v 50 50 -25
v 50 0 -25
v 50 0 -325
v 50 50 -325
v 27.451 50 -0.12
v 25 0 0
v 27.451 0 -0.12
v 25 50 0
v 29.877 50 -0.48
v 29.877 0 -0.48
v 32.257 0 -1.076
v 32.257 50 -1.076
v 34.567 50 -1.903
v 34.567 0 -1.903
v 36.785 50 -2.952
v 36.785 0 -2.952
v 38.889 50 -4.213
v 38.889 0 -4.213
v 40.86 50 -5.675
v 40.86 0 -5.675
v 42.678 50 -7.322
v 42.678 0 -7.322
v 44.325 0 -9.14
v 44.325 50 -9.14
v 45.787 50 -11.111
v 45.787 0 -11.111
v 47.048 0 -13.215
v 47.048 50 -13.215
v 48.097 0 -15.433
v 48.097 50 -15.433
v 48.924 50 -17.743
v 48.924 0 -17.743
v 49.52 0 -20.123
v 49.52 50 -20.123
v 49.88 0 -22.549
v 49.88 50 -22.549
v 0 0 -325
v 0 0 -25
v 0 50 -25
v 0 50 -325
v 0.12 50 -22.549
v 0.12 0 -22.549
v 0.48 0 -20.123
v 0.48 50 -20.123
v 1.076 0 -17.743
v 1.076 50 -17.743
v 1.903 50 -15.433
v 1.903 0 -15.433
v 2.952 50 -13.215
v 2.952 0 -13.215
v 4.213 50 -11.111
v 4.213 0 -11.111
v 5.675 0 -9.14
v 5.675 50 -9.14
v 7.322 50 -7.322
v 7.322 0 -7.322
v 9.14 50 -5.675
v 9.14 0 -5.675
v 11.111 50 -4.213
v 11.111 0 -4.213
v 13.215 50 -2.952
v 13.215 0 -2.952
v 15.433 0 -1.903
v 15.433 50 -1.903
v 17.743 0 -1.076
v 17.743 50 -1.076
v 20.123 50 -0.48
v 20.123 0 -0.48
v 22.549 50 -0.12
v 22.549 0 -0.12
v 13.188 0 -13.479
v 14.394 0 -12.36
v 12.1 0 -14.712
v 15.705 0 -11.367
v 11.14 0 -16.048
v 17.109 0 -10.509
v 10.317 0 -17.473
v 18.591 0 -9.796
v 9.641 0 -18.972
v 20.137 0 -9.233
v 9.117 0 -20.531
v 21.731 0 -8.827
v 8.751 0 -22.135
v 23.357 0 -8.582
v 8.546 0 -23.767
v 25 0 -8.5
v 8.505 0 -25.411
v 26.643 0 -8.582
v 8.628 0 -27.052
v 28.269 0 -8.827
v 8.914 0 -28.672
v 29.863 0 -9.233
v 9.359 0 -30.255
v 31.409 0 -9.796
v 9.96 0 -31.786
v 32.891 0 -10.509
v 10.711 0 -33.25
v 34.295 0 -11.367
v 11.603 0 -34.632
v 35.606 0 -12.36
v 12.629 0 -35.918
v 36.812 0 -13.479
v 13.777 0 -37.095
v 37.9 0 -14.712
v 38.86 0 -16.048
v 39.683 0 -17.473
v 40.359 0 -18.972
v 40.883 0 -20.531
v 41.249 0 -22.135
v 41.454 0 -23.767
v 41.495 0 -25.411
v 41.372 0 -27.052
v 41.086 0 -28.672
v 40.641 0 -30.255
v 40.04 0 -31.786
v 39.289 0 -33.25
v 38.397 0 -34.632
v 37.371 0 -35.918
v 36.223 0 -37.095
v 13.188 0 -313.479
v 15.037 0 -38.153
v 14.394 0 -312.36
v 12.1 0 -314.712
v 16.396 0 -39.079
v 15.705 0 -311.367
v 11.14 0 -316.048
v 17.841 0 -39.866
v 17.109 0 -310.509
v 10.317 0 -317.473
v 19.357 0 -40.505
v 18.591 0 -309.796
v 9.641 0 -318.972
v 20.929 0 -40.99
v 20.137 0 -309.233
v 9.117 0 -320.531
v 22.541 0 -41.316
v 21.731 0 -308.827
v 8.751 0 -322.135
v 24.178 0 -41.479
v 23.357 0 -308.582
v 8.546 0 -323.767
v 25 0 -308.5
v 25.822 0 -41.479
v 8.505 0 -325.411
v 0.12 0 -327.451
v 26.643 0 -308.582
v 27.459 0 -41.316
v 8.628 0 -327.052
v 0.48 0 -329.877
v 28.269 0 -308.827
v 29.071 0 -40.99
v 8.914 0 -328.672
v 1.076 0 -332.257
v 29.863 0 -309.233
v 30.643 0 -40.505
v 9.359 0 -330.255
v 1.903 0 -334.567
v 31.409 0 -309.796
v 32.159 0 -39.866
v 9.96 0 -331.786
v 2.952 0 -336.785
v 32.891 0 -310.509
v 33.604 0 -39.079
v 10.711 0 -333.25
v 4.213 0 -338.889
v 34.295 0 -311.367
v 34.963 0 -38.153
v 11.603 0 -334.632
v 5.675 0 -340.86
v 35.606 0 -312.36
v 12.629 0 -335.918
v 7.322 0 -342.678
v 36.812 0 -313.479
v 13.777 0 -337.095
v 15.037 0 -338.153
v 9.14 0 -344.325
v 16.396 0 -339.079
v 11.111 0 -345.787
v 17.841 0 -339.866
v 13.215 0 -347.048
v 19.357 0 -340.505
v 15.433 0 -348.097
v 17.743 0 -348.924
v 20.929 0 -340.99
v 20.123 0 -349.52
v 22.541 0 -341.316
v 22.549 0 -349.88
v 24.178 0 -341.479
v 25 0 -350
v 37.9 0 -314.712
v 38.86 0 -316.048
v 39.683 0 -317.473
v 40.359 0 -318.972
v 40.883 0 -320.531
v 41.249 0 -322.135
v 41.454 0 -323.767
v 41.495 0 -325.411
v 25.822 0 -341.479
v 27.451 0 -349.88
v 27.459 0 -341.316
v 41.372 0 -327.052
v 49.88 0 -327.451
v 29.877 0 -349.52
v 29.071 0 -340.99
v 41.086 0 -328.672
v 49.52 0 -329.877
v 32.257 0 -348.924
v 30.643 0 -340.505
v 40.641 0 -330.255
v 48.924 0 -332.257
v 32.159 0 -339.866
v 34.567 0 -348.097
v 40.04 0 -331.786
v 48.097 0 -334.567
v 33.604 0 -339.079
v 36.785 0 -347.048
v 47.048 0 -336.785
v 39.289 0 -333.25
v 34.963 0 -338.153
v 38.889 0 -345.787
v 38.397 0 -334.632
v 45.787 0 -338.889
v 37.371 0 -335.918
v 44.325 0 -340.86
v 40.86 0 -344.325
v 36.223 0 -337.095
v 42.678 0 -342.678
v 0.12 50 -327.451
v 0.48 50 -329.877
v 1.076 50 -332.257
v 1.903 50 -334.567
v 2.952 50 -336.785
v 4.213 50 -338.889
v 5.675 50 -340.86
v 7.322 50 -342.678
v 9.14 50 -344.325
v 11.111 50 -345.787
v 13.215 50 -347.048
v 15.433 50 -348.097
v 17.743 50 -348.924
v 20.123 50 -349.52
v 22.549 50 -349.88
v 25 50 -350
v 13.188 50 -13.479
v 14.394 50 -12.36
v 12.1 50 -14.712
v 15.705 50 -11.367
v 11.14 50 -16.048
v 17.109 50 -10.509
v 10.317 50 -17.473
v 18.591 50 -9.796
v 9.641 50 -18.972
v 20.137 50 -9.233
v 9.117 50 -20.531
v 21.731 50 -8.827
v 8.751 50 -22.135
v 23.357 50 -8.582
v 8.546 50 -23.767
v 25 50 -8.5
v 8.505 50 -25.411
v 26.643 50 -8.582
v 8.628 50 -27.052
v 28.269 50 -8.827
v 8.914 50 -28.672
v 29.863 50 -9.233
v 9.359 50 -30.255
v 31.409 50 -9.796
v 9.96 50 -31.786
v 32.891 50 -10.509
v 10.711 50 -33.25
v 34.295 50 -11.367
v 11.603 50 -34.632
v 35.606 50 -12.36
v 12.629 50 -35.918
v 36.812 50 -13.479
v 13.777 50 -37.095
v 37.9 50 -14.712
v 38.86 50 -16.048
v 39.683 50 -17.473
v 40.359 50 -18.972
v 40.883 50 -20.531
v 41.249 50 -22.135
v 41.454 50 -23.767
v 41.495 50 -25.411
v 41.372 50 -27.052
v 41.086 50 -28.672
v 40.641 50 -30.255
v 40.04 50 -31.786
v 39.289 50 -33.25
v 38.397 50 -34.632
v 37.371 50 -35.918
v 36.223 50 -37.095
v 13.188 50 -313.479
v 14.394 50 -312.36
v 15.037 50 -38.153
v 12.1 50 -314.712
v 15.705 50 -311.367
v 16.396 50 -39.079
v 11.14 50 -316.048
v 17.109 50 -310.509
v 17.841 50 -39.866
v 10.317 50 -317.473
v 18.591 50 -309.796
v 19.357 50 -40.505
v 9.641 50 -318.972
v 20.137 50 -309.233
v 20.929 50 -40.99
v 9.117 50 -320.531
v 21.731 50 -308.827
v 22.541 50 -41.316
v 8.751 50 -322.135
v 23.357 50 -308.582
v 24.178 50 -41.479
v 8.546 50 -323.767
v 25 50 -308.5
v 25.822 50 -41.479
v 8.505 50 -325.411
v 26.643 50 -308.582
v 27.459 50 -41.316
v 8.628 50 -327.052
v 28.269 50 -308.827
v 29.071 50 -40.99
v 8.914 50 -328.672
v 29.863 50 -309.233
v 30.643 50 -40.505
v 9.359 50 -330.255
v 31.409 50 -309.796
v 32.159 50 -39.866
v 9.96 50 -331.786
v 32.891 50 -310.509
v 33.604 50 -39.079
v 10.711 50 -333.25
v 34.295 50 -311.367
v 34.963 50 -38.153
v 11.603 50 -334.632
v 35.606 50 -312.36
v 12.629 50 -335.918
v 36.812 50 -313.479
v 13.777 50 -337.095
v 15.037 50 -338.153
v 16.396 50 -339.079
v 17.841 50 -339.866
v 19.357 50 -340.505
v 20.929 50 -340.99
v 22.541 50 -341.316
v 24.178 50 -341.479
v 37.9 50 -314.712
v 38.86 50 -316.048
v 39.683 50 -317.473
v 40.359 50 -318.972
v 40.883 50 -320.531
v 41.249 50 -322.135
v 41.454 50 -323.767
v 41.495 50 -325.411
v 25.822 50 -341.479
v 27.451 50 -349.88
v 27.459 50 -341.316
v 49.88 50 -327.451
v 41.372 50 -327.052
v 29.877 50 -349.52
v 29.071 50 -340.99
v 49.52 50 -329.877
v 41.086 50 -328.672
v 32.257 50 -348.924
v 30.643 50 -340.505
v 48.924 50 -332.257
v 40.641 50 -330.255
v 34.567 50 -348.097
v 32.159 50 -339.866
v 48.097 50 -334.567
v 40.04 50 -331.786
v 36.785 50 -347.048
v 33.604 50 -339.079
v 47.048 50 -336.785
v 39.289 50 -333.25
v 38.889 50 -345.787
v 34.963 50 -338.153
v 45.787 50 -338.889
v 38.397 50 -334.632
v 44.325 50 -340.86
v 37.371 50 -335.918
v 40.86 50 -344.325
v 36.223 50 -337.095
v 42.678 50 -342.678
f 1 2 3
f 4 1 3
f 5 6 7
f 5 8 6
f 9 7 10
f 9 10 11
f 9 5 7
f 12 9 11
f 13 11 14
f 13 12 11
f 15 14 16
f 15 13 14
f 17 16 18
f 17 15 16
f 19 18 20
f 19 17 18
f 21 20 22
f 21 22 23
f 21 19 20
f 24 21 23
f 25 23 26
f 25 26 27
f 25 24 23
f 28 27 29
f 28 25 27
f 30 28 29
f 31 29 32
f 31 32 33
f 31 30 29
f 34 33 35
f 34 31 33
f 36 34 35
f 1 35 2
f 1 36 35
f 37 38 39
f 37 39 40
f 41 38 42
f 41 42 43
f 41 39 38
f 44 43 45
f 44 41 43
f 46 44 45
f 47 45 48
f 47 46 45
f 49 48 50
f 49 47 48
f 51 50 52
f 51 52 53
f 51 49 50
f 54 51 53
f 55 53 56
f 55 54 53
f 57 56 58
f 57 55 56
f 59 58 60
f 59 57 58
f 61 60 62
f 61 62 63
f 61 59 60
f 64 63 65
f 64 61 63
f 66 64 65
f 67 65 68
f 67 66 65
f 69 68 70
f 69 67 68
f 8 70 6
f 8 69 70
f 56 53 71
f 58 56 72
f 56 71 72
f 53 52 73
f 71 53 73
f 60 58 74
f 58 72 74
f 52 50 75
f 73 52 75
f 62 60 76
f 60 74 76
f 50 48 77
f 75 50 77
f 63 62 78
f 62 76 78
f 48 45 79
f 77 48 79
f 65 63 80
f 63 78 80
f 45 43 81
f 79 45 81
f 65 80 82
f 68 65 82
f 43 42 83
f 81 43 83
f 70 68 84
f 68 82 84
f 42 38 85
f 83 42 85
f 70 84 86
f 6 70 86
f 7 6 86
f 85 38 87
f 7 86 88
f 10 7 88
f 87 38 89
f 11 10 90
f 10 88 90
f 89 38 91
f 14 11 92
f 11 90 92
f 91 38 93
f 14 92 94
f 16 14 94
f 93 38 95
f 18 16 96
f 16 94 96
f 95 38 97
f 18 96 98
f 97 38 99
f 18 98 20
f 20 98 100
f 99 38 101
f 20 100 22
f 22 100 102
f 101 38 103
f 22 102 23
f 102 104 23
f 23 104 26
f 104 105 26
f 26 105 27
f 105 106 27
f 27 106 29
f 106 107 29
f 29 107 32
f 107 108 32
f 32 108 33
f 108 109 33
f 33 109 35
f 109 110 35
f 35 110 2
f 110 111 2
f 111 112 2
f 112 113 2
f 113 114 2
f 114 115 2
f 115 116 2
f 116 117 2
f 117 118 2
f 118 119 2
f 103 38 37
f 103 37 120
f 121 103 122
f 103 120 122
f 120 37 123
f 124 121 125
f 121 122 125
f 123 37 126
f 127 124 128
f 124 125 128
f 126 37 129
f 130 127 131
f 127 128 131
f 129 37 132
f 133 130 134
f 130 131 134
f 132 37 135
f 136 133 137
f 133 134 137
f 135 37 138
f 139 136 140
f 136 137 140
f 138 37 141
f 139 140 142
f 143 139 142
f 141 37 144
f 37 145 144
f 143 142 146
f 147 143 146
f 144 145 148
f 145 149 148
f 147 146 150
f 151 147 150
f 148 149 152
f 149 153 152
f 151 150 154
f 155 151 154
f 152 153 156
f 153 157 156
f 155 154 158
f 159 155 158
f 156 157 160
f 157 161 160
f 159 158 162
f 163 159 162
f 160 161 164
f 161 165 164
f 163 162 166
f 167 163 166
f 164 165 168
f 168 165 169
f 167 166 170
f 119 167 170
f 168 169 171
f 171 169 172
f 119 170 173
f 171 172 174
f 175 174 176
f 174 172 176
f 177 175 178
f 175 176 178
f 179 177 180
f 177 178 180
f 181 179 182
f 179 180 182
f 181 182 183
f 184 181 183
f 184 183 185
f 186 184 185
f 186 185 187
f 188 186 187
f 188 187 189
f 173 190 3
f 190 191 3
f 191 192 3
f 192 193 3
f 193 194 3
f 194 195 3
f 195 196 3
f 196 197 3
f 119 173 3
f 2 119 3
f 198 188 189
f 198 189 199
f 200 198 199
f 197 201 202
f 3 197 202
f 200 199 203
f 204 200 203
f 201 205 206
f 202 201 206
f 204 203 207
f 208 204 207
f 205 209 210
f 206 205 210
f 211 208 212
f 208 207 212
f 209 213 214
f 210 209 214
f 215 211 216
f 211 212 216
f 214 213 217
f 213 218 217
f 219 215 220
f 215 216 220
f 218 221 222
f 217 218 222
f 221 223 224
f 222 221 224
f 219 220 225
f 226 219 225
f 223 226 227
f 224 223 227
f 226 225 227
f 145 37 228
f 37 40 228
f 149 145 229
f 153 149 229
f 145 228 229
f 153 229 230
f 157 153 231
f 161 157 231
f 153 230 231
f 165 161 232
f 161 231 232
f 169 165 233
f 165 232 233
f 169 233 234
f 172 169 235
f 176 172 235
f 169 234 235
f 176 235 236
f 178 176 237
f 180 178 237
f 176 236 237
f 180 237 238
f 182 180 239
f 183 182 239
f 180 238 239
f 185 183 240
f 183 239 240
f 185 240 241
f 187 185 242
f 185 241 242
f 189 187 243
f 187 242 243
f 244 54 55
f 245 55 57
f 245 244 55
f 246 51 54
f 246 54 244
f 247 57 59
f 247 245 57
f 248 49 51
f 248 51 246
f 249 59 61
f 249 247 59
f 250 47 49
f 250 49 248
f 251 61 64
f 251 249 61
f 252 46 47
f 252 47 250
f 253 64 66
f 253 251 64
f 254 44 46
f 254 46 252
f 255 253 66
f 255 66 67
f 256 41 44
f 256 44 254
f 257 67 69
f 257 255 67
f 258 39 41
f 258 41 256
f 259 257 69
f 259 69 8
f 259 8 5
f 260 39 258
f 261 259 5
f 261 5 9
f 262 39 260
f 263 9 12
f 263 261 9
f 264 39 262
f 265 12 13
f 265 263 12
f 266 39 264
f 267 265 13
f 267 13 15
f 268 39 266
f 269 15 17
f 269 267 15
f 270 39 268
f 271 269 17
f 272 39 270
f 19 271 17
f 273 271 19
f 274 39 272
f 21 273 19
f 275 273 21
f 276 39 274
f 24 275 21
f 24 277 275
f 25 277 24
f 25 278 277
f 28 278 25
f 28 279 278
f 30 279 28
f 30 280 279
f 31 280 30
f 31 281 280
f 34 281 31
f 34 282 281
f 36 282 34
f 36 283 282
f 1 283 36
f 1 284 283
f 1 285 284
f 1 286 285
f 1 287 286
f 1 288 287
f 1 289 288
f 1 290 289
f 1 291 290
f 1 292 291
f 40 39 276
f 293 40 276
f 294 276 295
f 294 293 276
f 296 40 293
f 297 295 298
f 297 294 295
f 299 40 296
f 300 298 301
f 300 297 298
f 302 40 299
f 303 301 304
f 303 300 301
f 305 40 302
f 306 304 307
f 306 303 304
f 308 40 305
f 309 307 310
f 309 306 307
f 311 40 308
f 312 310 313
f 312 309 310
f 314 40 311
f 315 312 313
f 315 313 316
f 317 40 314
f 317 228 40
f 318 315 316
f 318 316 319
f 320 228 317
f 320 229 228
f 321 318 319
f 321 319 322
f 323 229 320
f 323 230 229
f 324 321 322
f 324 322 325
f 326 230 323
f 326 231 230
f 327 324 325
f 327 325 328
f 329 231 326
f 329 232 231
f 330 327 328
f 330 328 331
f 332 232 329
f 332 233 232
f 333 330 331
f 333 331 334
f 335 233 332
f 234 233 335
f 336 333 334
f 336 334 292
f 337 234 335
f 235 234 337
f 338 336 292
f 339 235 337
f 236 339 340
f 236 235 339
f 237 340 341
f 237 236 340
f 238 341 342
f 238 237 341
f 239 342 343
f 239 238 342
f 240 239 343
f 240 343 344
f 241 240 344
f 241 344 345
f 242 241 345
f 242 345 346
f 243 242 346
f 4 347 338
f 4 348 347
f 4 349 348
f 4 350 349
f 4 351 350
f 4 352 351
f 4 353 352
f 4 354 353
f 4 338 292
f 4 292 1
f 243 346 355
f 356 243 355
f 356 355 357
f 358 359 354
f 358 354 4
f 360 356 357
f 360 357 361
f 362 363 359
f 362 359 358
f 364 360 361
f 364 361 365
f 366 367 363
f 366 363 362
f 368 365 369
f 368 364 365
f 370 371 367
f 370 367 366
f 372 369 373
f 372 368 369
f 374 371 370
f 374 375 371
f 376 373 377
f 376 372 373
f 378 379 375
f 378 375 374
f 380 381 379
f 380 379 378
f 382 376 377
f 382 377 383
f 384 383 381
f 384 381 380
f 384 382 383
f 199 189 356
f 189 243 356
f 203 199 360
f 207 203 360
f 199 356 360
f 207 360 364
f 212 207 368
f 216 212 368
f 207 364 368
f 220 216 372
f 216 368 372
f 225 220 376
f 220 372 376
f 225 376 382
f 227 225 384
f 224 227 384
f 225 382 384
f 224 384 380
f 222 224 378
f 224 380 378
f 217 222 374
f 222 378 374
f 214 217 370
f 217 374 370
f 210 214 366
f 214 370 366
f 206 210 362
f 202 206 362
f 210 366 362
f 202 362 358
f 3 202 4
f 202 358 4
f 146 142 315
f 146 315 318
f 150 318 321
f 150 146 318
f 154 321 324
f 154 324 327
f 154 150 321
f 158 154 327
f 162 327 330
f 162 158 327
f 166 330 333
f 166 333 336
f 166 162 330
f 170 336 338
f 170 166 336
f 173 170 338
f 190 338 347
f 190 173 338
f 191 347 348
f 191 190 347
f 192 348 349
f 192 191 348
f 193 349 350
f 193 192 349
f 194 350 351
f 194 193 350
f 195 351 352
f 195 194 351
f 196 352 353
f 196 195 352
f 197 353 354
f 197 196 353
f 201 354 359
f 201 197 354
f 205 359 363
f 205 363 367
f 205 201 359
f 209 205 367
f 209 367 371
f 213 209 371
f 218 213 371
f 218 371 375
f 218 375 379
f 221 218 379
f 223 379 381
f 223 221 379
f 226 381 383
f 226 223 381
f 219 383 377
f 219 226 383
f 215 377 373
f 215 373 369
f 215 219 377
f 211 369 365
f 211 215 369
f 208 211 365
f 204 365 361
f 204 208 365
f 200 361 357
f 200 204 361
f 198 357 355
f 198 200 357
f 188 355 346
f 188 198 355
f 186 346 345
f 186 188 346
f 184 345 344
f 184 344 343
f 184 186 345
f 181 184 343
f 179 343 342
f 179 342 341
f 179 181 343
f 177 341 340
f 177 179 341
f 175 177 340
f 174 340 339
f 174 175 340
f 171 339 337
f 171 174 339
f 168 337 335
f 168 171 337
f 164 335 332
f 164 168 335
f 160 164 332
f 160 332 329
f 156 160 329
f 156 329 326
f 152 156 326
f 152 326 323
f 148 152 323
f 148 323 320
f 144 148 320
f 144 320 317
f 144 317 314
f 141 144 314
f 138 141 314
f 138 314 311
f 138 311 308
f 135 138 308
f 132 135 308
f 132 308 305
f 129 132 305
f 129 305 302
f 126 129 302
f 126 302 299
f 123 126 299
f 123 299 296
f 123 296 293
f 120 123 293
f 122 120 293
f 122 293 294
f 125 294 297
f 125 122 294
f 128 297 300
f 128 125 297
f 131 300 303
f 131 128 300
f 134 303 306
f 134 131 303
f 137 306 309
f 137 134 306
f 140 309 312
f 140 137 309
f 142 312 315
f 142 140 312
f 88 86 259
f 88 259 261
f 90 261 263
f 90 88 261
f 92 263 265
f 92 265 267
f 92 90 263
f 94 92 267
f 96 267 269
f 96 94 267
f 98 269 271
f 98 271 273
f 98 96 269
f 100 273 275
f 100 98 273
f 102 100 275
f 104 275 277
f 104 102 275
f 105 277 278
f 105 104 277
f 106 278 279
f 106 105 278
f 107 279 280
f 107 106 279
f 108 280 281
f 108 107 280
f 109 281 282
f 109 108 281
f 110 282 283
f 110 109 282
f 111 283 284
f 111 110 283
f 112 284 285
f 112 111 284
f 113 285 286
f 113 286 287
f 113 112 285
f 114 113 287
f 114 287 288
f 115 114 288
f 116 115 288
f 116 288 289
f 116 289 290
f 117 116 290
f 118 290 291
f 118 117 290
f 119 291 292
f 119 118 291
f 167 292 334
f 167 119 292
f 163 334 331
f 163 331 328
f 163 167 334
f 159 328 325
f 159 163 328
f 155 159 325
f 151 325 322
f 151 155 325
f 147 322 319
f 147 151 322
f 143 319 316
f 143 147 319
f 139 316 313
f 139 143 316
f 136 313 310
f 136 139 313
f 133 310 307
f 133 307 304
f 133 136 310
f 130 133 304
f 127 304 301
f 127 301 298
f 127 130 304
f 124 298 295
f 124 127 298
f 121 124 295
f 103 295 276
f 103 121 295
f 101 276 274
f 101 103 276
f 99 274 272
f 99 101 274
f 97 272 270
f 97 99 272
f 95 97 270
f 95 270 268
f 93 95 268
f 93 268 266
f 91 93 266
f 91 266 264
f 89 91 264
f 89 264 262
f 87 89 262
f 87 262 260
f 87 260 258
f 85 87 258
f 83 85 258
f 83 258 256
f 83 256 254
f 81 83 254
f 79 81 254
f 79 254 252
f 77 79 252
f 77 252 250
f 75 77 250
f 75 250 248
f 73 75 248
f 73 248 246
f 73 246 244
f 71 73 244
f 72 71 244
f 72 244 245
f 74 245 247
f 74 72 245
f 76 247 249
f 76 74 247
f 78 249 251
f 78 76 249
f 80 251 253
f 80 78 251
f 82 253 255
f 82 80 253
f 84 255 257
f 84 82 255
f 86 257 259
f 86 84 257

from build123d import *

# Parameters (mm, degrees)
SKETCH_2_W      = 50
SKETCH_2_H      = 350
SKETCH_2_R      = 16.5
EXTRUDE_2_DEPTH = 50
FILLET_1_R      = 25
FILLET_2_R      = 25


with BuildPart() as part:
    # 草图2 → 凸台-拉伸2 (new body)
    with BuildSketch(Plane(origin=(0, 0, 0), x_dir=(1, 0, 0), z_dir=(0, 1, 0))):
        with Locations((25, 175)):
            Rectangle(SKETCH_2_W, SKETCH_2_H)
        with Locations(Location((25, 25, 0), (0, 0, 270))):
            Circle(SKETCH_2_R, mode=Mode.SUBTRACT)
        with Locations(Location((25, 325, 0), (0, 0, 270))):
            Circle(SKETCH_2_R, mode=Mode.SUBTRACT)
    extrude(amount=EXTRUDE_2_DEPTH)

    # 圆角1
    fillet_1_edges = [part.edges().sort_by_distance(p)[0] for p in [
        (50, 25, 0),
        (0, 25, 0),
    ]]
    fillet(fillet_1_edges, radius=FILLET_1_R - 0.0001)  # a hair under: the kernel refuses the full size

    # 圆角2
    fillet_2_edges = [part.edges().sort_by_distance(p)[0] for p in [
        (50, 25, -350),
        (0, 25, -350),
    ]]
    fillet(fillet_2_edges, radius=FILLET_2_R - 0.0001)  # a hair under: the kernel refuses the full size


solid = part.part
